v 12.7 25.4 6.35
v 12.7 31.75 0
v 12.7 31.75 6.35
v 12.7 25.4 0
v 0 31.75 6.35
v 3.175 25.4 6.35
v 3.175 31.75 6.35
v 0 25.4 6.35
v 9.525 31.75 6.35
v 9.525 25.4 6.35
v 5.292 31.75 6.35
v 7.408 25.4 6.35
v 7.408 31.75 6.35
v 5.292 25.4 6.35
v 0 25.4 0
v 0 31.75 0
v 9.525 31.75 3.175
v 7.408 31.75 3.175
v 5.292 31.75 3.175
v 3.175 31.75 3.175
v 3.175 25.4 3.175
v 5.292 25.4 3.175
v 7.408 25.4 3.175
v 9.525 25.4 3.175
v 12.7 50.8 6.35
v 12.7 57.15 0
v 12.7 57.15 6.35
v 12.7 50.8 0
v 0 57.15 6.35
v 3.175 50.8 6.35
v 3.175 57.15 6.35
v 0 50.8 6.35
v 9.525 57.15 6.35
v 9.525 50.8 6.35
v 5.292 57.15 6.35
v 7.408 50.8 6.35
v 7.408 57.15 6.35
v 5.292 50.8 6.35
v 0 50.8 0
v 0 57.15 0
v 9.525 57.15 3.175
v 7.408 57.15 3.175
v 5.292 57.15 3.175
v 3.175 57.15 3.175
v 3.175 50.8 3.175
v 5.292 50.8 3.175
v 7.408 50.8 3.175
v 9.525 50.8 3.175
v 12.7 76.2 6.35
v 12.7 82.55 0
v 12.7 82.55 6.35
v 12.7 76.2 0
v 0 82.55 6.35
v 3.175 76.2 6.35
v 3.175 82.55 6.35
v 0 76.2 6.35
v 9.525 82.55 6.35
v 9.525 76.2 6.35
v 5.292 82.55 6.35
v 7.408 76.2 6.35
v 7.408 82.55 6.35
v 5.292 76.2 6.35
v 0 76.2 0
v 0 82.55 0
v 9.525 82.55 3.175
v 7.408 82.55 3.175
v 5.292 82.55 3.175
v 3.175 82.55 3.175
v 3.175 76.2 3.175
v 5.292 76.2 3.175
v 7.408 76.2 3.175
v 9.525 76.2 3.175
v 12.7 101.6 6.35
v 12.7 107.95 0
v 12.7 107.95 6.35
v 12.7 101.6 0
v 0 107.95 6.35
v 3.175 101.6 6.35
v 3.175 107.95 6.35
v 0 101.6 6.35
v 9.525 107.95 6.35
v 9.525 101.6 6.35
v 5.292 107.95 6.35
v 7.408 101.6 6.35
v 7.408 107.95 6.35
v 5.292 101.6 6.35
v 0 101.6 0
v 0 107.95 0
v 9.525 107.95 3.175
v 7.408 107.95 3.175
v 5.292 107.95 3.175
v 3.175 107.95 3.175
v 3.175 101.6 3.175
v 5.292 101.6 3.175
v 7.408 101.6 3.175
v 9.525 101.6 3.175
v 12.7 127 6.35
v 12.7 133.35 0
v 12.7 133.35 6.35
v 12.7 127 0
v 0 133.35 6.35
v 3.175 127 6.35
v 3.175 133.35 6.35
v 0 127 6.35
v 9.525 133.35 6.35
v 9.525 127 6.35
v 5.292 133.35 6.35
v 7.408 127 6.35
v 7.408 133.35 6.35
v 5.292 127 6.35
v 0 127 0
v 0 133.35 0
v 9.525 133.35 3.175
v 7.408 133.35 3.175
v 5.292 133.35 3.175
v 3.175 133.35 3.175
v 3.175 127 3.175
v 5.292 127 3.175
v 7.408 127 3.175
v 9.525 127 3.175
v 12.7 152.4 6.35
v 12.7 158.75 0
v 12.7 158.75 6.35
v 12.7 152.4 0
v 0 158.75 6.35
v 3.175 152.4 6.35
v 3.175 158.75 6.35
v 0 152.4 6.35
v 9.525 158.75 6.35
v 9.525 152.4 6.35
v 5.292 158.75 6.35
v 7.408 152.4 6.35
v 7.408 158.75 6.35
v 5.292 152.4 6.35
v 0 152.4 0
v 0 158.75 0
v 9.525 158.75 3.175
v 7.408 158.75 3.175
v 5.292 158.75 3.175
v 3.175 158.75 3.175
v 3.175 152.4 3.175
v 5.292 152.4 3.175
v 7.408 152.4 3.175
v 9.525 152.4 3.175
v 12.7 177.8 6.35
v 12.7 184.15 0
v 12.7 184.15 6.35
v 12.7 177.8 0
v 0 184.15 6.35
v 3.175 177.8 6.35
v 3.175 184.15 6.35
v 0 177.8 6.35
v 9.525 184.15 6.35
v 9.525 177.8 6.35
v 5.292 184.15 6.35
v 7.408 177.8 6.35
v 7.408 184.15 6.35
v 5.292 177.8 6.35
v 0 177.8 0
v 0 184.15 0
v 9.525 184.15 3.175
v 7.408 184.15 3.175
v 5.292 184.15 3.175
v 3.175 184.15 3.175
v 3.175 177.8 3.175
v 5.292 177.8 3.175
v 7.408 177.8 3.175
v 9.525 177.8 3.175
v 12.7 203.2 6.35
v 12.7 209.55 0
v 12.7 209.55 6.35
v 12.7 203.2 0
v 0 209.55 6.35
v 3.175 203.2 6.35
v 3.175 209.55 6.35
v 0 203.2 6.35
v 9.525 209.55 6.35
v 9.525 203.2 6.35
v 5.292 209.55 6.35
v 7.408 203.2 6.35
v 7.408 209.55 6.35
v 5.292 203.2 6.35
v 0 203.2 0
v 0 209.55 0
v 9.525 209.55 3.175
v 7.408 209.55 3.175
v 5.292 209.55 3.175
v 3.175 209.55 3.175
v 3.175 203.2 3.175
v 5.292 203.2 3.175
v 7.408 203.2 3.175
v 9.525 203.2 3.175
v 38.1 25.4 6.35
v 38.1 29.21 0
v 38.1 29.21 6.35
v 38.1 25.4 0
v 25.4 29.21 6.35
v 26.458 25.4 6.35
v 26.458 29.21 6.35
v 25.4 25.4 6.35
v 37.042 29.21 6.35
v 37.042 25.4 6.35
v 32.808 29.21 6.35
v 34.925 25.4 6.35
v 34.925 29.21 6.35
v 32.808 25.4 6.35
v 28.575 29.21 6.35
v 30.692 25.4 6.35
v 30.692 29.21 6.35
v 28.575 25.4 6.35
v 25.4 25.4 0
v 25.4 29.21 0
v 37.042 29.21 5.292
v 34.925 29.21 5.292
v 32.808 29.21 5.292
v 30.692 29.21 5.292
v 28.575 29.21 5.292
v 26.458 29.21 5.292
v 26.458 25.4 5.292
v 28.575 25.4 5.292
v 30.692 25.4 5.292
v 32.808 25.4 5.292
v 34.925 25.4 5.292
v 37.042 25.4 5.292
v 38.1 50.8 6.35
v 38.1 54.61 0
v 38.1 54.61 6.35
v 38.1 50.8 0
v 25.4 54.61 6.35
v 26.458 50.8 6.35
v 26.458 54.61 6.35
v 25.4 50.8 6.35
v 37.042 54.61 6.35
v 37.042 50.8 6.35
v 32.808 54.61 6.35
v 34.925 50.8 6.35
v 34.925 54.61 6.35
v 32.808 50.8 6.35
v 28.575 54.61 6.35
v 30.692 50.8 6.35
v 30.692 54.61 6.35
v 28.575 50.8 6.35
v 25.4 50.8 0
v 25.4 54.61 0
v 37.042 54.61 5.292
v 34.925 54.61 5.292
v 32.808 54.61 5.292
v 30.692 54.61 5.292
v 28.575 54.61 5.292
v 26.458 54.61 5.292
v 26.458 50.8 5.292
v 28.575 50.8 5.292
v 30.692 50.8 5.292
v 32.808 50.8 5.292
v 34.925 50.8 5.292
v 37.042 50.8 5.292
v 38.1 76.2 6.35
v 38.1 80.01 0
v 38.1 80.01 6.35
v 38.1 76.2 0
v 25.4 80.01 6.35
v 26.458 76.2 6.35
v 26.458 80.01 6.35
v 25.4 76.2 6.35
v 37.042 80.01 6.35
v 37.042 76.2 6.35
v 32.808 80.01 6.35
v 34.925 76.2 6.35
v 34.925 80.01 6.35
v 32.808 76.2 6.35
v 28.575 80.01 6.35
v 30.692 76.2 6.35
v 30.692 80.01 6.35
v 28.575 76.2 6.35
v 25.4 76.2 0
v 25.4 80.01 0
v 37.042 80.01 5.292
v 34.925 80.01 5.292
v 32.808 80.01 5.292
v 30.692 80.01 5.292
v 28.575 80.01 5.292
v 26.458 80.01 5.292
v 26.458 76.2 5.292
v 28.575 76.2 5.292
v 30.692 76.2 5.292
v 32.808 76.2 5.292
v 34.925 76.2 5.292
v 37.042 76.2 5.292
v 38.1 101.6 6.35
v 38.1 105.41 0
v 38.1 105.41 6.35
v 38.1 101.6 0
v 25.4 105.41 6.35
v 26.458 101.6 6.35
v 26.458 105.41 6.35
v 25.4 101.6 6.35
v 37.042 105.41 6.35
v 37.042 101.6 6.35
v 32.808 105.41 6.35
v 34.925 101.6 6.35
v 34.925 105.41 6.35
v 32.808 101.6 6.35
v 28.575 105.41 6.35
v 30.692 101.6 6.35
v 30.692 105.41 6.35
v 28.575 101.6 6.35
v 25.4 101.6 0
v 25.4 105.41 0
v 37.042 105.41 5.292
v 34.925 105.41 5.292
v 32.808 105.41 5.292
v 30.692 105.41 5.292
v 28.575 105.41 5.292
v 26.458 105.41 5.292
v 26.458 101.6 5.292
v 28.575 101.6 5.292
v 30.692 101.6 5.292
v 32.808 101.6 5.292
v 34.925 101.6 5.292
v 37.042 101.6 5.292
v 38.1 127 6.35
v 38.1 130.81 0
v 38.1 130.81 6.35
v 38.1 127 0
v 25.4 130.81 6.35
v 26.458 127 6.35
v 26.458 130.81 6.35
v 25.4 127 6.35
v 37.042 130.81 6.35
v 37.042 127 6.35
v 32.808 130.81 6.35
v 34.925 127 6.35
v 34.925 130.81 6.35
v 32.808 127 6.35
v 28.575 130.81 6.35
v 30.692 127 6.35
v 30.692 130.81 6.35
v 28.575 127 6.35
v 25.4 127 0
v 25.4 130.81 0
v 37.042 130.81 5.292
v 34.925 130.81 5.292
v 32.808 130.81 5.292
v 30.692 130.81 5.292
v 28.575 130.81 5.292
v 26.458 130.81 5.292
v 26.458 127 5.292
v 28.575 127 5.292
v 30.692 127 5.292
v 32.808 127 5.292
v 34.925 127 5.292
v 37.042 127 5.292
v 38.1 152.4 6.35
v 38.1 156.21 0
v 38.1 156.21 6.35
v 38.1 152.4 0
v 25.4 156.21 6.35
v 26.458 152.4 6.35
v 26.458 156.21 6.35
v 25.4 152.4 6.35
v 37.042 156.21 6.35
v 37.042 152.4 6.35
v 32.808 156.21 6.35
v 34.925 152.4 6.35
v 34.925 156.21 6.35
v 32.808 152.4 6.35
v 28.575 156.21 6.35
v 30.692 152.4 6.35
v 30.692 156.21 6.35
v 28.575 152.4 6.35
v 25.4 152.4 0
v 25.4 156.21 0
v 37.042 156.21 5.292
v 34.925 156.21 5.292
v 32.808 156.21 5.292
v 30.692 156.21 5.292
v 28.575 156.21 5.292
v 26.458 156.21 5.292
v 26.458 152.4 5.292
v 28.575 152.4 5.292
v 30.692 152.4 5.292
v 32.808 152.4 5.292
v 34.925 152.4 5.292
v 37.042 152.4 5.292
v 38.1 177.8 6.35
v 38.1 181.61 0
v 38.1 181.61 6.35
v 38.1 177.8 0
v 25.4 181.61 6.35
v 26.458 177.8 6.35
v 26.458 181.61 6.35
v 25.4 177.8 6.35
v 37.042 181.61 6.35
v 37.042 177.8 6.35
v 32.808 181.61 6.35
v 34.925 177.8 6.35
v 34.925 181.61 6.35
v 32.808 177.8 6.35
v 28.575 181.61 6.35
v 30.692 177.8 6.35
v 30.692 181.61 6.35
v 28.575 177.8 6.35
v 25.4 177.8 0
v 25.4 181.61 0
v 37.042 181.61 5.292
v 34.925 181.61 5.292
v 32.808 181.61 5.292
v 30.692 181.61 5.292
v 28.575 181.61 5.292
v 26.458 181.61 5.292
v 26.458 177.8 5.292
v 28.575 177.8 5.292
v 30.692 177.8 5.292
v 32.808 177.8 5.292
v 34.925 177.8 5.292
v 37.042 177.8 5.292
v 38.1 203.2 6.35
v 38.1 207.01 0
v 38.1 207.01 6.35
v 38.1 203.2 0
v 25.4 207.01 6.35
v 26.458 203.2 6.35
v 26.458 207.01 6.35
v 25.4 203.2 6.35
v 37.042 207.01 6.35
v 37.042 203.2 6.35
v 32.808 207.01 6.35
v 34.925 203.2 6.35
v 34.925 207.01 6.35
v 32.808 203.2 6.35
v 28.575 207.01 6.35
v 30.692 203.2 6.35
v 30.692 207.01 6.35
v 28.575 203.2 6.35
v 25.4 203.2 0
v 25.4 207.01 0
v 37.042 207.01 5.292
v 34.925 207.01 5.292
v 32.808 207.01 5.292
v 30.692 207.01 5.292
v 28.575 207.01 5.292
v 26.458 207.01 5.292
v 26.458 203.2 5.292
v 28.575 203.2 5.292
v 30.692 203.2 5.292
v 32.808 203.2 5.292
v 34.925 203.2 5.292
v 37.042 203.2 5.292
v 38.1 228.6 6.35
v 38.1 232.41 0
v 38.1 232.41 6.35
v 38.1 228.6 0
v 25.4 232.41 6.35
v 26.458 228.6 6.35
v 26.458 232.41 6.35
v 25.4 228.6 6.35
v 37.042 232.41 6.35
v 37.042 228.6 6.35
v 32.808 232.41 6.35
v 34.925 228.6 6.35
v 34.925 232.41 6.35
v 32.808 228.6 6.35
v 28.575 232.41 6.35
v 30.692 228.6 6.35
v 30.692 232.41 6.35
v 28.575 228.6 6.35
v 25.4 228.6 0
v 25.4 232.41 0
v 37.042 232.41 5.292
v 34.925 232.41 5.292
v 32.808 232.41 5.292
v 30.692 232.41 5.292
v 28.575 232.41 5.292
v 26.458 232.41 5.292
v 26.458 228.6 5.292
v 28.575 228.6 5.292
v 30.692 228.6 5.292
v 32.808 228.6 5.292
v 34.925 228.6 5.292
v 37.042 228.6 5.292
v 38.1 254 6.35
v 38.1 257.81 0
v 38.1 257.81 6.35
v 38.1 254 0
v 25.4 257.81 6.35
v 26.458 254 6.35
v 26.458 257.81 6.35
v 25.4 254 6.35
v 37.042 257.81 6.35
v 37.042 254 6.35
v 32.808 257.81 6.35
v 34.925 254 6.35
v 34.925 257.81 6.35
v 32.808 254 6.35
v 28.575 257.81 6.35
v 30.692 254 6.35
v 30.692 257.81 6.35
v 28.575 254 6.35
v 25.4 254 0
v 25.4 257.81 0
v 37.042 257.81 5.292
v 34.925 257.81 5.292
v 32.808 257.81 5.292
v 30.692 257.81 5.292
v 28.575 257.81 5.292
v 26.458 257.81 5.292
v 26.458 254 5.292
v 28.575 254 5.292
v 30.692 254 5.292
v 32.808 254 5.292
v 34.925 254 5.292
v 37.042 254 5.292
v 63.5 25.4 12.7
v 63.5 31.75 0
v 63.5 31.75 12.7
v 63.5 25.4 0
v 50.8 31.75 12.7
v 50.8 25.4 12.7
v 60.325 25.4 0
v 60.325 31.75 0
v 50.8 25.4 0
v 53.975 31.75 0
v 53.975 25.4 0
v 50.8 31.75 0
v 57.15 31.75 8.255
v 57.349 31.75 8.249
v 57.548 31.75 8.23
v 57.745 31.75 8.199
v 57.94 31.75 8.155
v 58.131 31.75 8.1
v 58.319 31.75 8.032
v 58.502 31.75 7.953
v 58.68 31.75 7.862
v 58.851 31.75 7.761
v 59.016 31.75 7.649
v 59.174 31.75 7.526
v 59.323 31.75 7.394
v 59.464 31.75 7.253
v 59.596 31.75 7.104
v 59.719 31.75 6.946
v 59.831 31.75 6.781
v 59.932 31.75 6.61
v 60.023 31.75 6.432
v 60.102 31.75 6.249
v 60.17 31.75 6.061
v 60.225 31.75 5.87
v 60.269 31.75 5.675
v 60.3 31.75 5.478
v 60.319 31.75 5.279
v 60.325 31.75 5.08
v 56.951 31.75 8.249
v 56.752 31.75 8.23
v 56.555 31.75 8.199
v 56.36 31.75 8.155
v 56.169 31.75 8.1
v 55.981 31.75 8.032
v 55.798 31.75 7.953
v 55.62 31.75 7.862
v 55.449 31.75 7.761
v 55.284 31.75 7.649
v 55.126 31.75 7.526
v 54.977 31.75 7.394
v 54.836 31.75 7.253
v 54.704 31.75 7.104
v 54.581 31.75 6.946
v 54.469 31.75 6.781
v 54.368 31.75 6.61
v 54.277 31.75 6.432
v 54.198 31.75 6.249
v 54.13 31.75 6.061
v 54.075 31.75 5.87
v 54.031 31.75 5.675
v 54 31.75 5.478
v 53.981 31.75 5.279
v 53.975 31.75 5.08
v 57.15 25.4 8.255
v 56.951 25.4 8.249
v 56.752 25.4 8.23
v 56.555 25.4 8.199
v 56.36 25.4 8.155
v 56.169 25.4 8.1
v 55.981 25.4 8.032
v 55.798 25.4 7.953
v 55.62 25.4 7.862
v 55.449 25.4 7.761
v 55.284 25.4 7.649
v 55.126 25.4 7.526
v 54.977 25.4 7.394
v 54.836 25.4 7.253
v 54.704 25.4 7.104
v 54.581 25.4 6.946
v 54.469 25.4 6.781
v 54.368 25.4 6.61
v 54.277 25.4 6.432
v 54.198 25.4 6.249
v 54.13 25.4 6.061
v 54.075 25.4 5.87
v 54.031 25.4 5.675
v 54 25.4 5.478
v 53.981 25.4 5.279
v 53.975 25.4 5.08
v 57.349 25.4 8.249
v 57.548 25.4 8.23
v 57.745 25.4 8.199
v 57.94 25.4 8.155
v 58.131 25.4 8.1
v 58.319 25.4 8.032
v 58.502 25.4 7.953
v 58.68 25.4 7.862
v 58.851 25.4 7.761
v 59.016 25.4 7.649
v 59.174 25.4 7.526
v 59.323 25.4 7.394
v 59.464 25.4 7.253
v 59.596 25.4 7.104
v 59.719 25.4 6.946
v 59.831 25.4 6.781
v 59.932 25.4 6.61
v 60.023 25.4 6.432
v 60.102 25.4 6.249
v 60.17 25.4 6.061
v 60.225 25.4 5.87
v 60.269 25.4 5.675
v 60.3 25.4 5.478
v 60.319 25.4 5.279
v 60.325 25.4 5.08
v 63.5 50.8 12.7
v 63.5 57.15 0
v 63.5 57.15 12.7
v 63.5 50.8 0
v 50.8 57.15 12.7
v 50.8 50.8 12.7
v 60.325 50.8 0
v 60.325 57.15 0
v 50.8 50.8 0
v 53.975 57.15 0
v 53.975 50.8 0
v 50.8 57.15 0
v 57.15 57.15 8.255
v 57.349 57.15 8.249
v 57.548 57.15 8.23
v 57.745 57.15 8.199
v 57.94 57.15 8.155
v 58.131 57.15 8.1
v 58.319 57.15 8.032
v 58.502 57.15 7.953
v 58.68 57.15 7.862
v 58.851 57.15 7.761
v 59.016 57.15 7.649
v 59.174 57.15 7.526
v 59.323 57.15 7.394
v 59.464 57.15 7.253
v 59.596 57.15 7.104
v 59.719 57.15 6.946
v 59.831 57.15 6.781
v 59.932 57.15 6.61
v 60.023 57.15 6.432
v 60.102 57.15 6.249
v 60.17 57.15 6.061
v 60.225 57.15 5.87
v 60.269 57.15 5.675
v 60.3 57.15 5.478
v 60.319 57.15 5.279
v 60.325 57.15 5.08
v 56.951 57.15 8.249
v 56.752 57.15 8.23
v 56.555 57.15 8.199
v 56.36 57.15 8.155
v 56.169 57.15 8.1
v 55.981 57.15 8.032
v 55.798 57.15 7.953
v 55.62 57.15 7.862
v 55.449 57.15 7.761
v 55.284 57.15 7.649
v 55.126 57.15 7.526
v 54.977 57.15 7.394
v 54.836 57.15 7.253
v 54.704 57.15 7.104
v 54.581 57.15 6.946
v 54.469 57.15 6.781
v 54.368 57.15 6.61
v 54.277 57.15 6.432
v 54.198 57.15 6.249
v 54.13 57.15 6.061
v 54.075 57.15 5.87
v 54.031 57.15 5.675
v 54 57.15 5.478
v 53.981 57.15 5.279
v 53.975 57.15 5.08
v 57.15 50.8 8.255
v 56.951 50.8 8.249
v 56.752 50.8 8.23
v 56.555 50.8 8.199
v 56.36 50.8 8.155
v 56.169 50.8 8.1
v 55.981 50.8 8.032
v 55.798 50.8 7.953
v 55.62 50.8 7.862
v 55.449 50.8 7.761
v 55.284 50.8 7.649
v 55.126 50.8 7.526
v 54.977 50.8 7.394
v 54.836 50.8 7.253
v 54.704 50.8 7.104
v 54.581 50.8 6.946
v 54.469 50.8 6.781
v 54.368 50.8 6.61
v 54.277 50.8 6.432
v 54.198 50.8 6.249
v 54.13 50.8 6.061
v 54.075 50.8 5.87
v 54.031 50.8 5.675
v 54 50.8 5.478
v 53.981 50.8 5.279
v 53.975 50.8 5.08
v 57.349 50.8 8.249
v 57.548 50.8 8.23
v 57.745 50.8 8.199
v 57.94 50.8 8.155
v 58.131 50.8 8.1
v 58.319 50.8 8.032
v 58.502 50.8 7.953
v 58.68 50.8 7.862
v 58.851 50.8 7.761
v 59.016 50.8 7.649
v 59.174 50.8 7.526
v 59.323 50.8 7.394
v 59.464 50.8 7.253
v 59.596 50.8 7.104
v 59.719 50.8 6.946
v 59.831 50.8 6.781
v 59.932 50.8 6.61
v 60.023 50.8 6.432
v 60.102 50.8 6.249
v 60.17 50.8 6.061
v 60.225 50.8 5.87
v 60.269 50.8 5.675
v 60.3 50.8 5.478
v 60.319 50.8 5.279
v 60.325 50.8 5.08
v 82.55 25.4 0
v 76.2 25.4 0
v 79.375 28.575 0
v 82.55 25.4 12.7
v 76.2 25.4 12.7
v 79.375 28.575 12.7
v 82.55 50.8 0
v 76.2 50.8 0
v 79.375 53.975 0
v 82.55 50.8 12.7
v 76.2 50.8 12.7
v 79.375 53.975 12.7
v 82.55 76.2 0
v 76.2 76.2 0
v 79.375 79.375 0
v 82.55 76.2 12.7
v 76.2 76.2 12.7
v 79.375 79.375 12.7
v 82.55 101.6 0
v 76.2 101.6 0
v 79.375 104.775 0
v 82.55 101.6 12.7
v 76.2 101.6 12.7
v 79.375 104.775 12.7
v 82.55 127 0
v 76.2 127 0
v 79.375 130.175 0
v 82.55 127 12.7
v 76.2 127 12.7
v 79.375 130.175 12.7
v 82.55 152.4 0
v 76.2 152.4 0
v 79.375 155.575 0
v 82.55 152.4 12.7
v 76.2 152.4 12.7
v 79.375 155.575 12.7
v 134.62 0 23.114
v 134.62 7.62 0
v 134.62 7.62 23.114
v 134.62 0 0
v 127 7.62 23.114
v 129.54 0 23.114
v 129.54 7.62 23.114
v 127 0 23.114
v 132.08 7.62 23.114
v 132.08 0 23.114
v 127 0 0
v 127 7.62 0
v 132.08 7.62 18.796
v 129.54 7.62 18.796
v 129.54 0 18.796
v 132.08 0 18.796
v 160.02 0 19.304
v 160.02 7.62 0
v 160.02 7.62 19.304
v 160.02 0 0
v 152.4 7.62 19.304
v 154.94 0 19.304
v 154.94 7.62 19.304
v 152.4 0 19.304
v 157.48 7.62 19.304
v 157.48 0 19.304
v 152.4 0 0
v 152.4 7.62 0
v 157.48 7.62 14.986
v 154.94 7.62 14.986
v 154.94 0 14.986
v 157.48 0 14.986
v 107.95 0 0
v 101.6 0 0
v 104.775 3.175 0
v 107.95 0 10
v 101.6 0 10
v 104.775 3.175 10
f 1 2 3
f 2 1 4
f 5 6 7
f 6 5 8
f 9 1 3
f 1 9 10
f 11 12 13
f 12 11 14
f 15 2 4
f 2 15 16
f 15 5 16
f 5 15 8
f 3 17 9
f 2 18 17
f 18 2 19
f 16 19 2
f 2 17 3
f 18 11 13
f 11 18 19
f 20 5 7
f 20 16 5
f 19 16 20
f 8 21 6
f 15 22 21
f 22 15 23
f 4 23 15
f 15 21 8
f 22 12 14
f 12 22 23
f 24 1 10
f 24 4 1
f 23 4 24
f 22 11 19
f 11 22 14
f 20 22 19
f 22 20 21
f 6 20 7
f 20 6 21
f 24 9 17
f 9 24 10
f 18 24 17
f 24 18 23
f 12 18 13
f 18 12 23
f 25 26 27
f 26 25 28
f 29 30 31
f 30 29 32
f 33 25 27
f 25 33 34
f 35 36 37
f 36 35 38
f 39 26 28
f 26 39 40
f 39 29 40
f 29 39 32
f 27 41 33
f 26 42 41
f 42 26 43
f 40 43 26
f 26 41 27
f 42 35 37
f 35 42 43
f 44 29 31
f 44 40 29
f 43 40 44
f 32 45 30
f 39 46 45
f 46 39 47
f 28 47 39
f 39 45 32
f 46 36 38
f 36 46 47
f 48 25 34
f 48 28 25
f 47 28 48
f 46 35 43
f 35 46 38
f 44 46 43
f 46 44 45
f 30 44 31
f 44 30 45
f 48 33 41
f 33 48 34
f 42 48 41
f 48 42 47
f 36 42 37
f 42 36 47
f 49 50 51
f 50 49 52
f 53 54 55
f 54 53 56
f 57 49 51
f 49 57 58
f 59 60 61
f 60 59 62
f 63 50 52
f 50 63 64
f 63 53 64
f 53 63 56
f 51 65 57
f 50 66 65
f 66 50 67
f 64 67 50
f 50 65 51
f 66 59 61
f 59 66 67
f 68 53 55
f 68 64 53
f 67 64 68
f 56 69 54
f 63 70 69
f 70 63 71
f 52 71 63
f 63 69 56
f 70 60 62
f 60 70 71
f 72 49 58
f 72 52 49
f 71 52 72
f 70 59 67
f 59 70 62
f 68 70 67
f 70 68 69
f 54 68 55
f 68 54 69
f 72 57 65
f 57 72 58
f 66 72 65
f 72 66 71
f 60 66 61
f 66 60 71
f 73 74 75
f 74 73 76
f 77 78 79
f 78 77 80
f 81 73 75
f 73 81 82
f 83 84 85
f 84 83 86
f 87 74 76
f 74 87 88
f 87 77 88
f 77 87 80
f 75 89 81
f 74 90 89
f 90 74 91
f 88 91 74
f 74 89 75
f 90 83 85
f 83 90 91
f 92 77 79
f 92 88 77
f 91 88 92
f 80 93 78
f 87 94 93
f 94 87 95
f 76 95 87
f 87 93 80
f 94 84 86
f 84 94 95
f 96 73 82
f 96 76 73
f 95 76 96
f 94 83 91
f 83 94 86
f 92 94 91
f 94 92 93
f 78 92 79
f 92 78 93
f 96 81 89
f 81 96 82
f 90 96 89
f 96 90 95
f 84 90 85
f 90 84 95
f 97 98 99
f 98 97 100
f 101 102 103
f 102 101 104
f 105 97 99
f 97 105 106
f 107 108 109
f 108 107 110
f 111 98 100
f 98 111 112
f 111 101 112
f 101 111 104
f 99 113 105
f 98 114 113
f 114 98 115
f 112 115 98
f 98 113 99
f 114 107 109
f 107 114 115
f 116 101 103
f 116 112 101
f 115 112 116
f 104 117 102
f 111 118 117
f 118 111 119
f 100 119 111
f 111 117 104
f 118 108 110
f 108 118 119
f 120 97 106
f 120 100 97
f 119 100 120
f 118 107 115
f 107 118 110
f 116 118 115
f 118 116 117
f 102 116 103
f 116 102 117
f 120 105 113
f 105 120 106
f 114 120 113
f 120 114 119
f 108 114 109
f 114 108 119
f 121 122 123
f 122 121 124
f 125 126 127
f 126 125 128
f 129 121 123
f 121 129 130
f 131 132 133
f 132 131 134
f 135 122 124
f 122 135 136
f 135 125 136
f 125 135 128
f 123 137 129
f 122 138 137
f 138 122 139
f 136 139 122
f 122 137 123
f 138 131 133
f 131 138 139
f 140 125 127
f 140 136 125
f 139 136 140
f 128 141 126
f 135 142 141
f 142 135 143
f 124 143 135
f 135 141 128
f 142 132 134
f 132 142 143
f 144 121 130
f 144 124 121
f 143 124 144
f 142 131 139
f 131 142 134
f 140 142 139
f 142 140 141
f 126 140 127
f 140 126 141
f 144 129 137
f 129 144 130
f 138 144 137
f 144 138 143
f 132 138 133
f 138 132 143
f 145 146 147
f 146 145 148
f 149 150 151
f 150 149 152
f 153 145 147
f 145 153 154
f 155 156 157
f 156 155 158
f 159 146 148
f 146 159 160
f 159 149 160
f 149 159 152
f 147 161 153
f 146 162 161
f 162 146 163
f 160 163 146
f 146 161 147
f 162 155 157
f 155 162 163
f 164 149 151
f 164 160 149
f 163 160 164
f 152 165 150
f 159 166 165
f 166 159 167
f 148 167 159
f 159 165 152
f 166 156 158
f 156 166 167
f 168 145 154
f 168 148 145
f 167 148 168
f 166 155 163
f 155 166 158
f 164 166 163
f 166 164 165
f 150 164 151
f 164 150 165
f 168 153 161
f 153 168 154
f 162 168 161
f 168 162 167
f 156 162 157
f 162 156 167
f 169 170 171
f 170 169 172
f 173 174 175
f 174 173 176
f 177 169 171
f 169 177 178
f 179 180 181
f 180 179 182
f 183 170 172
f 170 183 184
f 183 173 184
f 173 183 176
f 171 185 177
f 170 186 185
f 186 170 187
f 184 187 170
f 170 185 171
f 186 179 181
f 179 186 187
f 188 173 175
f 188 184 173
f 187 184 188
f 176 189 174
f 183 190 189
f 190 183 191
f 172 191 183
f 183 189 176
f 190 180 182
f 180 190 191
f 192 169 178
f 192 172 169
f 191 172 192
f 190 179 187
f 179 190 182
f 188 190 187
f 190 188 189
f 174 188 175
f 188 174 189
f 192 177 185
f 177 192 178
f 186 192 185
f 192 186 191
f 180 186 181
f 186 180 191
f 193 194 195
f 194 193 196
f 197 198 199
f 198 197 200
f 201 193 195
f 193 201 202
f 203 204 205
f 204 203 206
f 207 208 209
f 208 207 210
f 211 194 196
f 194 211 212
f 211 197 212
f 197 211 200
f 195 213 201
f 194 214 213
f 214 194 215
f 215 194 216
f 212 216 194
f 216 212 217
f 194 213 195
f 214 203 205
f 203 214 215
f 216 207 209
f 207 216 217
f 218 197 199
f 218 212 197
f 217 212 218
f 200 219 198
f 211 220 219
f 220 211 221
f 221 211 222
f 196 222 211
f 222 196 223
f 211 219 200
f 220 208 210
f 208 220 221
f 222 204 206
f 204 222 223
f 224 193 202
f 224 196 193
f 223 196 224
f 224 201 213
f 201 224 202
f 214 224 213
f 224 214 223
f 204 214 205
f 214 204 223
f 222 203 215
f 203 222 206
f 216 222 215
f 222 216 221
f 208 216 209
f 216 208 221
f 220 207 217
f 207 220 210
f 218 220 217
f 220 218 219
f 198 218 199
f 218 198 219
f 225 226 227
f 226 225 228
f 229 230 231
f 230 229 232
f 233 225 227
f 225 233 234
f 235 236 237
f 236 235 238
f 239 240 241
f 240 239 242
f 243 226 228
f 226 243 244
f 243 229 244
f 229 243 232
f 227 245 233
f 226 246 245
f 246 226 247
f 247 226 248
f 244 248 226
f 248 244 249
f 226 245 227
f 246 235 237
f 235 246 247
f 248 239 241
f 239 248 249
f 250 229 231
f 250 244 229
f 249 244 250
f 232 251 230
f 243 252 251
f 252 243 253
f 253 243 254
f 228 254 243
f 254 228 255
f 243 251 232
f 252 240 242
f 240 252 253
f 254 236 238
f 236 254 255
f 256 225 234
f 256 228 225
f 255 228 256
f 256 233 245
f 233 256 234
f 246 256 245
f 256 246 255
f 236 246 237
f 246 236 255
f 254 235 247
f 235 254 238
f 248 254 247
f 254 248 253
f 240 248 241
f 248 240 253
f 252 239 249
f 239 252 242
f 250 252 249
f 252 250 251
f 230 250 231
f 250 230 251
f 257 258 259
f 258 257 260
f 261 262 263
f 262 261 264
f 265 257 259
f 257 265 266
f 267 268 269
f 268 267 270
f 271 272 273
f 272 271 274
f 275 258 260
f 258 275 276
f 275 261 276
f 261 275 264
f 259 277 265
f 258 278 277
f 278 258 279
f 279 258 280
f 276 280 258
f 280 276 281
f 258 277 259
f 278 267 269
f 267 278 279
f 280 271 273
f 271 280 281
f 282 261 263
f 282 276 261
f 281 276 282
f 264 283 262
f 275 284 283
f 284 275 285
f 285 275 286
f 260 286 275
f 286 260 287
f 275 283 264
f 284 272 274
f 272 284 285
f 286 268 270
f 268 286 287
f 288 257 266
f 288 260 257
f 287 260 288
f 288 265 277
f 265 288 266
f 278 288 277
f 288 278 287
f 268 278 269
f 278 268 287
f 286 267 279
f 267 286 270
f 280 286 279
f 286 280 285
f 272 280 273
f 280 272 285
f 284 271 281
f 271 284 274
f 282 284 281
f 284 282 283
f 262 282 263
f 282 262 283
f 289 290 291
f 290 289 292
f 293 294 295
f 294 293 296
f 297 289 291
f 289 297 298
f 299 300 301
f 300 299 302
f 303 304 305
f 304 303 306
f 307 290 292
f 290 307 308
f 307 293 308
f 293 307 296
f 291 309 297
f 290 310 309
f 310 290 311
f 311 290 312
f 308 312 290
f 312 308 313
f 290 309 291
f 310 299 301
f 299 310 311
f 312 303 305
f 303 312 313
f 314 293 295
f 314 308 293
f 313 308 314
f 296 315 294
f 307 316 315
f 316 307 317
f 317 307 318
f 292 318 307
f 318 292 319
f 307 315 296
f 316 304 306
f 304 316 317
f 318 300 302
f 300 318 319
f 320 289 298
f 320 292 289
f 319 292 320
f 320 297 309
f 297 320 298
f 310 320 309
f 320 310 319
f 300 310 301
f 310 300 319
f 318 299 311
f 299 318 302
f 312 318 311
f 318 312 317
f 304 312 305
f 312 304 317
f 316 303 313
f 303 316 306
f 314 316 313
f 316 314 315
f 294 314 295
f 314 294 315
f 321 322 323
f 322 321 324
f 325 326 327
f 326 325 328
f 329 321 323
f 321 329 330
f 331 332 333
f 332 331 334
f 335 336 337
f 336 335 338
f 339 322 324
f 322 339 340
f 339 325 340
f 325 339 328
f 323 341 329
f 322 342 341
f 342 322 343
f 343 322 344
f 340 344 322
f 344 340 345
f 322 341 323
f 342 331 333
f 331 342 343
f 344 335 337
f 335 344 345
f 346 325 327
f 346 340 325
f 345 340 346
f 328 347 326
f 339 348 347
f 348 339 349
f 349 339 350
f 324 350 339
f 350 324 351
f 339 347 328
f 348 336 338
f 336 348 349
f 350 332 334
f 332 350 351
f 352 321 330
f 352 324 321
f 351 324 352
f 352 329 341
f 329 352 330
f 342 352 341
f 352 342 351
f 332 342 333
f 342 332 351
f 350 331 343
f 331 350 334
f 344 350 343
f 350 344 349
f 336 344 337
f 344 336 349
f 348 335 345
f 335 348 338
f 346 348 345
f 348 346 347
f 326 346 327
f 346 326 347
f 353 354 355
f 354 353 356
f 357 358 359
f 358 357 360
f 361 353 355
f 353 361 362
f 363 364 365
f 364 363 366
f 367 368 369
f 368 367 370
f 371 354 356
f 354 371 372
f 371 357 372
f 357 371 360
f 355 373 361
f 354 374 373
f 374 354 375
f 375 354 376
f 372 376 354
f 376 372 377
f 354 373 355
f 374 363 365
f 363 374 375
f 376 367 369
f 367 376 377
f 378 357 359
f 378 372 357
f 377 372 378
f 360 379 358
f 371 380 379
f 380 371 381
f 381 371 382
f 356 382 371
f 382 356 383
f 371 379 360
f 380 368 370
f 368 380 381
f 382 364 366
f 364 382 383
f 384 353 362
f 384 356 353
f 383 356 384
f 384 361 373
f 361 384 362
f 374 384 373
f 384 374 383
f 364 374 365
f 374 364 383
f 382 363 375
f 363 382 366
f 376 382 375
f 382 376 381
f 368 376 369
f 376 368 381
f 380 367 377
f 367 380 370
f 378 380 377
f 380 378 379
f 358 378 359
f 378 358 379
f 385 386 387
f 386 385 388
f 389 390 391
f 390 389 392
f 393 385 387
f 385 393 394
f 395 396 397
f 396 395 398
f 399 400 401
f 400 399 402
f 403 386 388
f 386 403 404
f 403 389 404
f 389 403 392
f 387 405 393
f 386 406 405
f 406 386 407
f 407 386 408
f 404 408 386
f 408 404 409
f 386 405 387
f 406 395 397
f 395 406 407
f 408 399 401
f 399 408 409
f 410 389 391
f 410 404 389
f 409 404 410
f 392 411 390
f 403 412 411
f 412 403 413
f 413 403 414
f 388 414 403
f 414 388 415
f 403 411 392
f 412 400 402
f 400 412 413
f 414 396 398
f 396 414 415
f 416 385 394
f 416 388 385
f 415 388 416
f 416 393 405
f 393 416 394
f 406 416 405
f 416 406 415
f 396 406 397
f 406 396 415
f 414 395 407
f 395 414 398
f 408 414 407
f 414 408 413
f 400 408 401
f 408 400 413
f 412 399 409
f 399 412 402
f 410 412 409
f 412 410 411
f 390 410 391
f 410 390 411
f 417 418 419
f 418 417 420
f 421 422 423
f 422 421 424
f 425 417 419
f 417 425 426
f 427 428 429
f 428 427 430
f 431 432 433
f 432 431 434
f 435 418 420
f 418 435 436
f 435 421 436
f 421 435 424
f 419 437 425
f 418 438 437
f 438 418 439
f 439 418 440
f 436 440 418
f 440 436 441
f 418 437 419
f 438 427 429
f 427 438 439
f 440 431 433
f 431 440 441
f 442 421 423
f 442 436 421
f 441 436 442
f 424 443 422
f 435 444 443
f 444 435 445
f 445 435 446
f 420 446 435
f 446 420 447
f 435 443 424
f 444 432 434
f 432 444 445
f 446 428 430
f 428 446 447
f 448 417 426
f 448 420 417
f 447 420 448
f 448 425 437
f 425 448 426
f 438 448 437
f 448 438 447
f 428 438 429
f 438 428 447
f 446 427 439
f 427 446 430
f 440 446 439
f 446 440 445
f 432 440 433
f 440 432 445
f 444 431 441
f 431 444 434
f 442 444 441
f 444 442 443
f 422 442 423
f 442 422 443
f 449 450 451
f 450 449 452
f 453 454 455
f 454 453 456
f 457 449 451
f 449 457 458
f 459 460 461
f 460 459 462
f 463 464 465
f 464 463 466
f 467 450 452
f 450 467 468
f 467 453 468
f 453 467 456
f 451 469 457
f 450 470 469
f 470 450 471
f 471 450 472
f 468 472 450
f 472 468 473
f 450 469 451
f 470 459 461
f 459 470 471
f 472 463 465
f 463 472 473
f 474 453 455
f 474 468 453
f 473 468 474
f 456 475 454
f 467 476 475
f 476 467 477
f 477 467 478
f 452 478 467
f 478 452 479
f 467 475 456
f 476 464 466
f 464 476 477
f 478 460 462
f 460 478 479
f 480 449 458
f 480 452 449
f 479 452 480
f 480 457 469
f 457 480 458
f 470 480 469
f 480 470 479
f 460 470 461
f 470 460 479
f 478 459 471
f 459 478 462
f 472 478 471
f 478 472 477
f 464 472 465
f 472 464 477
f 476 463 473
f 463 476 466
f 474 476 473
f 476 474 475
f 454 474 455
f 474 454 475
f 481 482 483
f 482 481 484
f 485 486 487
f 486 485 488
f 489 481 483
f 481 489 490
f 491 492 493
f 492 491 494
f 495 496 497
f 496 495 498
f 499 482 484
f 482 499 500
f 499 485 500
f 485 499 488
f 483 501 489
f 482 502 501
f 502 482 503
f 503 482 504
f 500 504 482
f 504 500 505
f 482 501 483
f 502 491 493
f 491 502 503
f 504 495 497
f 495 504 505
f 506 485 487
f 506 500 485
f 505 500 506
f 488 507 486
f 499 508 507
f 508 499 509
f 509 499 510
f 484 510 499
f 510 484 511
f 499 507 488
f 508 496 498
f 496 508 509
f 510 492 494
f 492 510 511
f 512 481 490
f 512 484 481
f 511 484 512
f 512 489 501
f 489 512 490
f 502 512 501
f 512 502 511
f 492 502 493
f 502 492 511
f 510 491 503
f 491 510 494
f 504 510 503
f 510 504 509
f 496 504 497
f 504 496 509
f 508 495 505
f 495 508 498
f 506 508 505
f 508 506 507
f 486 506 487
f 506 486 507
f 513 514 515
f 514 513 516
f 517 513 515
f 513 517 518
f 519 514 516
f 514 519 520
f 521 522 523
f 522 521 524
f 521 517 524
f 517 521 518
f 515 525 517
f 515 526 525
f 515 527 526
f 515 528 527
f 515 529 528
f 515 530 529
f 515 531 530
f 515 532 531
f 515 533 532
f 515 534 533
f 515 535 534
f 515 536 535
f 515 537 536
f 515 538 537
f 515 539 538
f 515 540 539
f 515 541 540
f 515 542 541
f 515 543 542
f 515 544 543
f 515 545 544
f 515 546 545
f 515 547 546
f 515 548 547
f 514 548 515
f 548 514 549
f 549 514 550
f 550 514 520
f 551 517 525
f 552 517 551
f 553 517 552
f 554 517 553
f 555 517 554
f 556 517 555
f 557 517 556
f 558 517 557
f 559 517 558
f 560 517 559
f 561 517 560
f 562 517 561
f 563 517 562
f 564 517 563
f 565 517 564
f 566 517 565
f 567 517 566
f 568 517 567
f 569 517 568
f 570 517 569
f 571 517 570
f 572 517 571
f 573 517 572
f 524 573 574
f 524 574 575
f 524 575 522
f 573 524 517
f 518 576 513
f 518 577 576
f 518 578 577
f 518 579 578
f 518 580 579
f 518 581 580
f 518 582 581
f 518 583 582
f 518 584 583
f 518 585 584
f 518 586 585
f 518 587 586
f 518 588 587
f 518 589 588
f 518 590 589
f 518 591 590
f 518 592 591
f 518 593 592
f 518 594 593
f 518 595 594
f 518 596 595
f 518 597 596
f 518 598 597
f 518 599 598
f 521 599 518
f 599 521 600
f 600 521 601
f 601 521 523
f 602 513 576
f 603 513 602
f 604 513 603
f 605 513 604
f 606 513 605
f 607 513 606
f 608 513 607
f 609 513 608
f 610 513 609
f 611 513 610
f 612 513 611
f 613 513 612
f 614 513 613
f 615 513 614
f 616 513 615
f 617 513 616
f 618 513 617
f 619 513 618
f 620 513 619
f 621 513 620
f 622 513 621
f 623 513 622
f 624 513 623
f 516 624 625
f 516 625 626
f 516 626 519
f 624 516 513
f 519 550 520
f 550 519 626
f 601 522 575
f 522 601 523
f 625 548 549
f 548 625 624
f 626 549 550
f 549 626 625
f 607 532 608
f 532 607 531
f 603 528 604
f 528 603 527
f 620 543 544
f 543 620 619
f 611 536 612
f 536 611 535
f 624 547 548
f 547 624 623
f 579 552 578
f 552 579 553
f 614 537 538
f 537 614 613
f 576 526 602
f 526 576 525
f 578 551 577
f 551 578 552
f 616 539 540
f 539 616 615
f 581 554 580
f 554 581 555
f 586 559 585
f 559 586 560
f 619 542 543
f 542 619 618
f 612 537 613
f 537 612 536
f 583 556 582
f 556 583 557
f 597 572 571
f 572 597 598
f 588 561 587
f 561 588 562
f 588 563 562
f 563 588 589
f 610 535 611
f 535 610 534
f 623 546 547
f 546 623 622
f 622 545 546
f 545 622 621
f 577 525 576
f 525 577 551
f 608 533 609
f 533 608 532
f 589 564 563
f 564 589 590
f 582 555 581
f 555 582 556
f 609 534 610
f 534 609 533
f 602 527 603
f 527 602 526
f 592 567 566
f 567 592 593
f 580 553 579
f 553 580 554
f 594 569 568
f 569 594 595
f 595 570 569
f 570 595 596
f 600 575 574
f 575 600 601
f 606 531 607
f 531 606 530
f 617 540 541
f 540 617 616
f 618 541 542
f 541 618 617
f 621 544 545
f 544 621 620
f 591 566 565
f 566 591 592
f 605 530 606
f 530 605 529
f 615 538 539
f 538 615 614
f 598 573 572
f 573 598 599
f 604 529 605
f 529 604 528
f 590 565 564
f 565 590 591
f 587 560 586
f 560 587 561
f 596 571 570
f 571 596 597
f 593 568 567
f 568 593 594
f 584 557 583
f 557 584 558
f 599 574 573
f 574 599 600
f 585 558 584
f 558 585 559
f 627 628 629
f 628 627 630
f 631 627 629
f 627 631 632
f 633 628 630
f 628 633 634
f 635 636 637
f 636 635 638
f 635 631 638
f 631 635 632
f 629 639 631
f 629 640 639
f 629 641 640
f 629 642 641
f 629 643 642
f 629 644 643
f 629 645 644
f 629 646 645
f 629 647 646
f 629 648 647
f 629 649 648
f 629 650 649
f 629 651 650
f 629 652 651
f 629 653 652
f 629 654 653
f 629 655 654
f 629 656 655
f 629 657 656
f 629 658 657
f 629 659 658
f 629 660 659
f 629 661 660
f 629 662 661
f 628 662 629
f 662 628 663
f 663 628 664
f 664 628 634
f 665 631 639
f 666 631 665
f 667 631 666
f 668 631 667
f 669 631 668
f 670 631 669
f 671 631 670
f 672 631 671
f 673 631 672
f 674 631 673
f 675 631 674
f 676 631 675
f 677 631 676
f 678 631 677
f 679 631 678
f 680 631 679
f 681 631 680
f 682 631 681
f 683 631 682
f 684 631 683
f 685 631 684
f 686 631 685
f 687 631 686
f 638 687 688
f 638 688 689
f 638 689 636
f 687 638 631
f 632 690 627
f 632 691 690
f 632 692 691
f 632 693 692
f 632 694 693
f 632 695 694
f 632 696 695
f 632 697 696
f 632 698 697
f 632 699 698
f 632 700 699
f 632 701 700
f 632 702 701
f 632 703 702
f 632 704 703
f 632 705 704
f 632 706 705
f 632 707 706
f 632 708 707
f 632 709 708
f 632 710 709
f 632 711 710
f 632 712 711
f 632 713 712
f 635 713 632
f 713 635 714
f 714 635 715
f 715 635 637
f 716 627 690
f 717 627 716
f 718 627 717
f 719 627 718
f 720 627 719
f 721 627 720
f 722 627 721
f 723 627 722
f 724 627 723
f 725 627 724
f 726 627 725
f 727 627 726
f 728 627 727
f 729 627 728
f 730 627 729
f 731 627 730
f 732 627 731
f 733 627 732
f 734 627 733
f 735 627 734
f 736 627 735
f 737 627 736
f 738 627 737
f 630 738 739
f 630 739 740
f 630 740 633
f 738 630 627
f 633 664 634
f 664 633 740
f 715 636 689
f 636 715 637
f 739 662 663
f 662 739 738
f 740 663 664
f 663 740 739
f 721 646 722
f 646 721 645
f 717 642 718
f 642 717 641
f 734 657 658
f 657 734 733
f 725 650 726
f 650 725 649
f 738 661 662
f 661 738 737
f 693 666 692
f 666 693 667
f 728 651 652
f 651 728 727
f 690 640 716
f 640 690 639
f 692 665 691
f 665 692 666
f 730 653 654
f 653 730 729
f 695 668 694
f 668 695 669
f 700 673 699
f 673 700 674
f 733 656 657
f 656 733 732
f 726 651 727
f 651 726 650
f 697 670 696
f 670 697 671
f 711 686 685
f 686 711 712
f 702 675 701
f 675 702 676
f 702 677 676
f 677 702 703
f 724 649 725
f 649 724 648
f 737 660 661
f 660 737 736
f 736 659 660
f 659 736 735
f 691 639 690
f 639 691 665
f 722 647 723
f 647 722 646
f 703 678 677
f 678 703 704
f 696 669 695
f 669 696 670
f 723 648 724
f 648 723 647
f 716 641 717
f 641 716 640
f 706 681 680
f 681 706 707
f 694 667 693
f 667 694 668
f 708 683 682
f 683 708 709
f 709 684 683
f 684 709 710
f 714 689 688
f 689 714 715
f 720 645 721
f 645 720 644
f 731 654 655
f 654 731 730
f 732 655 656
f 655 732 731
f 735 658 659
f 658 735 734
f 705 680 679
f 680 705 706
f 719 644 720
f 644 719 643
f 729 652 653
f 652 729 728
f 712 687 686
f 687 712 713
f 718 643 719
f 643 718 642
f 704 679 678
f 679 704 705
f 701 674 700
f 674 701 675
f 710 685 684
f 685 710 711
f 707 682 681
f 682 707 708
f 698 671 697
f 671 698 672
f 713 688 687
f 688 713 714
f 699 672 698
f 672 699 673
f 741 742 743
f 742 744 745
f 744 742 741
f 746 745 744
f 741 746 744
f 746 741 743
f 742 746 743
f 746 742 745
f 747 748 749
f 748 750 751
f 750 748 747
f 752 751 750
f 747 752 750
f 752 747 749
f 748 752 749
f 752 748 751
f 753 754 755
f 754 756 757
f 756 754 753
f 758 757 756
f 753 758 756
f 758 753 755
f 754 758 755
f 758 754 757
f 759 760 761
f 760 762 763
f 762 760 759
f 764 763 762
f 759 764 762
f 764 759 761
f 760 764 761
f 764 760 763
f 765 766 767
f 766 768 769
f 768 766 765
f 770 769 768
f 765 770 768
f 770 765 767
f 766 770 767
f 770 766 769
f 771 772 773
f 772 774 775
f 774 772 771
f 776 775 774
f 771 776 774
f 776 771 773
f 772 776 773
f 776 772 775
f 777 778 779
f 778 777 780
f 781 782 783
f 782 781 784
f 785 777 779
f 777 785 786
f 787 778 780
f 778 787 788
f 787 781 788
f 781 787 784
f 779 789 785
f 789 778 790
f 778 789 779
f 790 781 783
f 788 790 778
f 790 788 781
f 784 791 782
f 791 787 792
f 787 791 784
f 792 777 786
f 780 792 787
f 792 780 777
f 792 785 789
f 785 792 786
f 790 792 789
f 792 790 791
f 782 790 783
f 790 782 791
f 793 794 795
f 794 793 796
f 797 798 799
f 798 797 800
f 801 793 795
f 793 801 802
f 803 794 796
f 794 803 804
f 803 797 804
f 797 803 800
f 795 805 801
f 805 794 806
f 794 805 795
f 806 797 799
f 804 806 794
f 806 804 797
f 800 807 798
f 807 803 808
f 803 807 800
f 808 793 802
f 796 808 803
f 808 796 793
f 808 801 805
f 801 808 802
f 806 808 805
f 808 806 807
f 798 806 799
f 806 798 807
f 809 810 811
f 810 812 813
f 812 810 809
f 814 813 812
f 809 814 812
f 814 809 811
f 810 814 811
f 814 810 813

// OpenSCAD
UNIT = 25.4;
$fn=100;

castle();

module castle() {
    spacing = UNIT;
    for (a =[1:8]) translate([0,spacing*a,0]) wall();
    for (a =[1:10]) translate([spacing,spacing*a,0]) fence();
    for (a =[1:2]) translate([spacing*2,spacing*a,0]) gate();
    for (a =[1:6]) translate([spacing*3,spacing*a,0]) roof(UNIT/2);
    translate([spacing*4, 0, 0]) roof(10); //??????
    translate([spacing*5, 0, 0]) tower(UNIT*0.91);
    translate([spacing*6, 0, 0]) tower(UNIT*0.76);
    
}


module wall() {
    difference() {
        cube([UNIT/2, UNIT/4, UNIT/4]);
        translate([UNIT/8,0,UNIT/8]) cube([UNIT/12, UNIT/4, UNIT/8]);
        translate([UNIT*(7/24),0,UNIT/8]) cube([UNIT/12, UNIT/4, UNIT/8]);
    }
}

module gate() {
    difference() {
        cube([UNIT/2, UNIT/4, UNIT/2]);
        translate([UNIT/8,0,0]) cube([UNIT/4, UNIT/4, UNIT/5]);
        translate([UNIT/4,UNIT/4,UNIT/5]) rotate([90,0,0])cylinder(UNIT/4, UNIT/8, UNIT/8);
    }
}

module fence() {
    difference() {
        cube([UNIT/2, UNIT*(3/20), UNIT/4]);
        translate([UNIT*(9/24),0,UNIT*(5/24)]) cube([UNIT/12, UNIT/4, UNIT/24]);
        translate([UNIT*(5/24),0,UNIT*(5/24)]) cube([UNIT/12, UNIT/4, UNIT/24]);
        translate([UNIT*(1/24),0,UNIT*(5/24)]) cube([UNIT/12, UNIT/4, UNIT/24]);
    }
}

module tower(height) {
    difference() {
        opening_height = UNIT*0.17;
        cube([UNIT*(3/10), UNIT*(3/10), height]);
        translate([UNIT*(1/10),0,height-opening_height]) cube([UNIT*(1/10), UNIT*(3/10), opening_height]);
    }
}

module roof(lenght) {
    linear_extrude(lenght) polygon([[0,0],[UNIT/4,0],[UNIT/8,UNIT/8]]);
}
